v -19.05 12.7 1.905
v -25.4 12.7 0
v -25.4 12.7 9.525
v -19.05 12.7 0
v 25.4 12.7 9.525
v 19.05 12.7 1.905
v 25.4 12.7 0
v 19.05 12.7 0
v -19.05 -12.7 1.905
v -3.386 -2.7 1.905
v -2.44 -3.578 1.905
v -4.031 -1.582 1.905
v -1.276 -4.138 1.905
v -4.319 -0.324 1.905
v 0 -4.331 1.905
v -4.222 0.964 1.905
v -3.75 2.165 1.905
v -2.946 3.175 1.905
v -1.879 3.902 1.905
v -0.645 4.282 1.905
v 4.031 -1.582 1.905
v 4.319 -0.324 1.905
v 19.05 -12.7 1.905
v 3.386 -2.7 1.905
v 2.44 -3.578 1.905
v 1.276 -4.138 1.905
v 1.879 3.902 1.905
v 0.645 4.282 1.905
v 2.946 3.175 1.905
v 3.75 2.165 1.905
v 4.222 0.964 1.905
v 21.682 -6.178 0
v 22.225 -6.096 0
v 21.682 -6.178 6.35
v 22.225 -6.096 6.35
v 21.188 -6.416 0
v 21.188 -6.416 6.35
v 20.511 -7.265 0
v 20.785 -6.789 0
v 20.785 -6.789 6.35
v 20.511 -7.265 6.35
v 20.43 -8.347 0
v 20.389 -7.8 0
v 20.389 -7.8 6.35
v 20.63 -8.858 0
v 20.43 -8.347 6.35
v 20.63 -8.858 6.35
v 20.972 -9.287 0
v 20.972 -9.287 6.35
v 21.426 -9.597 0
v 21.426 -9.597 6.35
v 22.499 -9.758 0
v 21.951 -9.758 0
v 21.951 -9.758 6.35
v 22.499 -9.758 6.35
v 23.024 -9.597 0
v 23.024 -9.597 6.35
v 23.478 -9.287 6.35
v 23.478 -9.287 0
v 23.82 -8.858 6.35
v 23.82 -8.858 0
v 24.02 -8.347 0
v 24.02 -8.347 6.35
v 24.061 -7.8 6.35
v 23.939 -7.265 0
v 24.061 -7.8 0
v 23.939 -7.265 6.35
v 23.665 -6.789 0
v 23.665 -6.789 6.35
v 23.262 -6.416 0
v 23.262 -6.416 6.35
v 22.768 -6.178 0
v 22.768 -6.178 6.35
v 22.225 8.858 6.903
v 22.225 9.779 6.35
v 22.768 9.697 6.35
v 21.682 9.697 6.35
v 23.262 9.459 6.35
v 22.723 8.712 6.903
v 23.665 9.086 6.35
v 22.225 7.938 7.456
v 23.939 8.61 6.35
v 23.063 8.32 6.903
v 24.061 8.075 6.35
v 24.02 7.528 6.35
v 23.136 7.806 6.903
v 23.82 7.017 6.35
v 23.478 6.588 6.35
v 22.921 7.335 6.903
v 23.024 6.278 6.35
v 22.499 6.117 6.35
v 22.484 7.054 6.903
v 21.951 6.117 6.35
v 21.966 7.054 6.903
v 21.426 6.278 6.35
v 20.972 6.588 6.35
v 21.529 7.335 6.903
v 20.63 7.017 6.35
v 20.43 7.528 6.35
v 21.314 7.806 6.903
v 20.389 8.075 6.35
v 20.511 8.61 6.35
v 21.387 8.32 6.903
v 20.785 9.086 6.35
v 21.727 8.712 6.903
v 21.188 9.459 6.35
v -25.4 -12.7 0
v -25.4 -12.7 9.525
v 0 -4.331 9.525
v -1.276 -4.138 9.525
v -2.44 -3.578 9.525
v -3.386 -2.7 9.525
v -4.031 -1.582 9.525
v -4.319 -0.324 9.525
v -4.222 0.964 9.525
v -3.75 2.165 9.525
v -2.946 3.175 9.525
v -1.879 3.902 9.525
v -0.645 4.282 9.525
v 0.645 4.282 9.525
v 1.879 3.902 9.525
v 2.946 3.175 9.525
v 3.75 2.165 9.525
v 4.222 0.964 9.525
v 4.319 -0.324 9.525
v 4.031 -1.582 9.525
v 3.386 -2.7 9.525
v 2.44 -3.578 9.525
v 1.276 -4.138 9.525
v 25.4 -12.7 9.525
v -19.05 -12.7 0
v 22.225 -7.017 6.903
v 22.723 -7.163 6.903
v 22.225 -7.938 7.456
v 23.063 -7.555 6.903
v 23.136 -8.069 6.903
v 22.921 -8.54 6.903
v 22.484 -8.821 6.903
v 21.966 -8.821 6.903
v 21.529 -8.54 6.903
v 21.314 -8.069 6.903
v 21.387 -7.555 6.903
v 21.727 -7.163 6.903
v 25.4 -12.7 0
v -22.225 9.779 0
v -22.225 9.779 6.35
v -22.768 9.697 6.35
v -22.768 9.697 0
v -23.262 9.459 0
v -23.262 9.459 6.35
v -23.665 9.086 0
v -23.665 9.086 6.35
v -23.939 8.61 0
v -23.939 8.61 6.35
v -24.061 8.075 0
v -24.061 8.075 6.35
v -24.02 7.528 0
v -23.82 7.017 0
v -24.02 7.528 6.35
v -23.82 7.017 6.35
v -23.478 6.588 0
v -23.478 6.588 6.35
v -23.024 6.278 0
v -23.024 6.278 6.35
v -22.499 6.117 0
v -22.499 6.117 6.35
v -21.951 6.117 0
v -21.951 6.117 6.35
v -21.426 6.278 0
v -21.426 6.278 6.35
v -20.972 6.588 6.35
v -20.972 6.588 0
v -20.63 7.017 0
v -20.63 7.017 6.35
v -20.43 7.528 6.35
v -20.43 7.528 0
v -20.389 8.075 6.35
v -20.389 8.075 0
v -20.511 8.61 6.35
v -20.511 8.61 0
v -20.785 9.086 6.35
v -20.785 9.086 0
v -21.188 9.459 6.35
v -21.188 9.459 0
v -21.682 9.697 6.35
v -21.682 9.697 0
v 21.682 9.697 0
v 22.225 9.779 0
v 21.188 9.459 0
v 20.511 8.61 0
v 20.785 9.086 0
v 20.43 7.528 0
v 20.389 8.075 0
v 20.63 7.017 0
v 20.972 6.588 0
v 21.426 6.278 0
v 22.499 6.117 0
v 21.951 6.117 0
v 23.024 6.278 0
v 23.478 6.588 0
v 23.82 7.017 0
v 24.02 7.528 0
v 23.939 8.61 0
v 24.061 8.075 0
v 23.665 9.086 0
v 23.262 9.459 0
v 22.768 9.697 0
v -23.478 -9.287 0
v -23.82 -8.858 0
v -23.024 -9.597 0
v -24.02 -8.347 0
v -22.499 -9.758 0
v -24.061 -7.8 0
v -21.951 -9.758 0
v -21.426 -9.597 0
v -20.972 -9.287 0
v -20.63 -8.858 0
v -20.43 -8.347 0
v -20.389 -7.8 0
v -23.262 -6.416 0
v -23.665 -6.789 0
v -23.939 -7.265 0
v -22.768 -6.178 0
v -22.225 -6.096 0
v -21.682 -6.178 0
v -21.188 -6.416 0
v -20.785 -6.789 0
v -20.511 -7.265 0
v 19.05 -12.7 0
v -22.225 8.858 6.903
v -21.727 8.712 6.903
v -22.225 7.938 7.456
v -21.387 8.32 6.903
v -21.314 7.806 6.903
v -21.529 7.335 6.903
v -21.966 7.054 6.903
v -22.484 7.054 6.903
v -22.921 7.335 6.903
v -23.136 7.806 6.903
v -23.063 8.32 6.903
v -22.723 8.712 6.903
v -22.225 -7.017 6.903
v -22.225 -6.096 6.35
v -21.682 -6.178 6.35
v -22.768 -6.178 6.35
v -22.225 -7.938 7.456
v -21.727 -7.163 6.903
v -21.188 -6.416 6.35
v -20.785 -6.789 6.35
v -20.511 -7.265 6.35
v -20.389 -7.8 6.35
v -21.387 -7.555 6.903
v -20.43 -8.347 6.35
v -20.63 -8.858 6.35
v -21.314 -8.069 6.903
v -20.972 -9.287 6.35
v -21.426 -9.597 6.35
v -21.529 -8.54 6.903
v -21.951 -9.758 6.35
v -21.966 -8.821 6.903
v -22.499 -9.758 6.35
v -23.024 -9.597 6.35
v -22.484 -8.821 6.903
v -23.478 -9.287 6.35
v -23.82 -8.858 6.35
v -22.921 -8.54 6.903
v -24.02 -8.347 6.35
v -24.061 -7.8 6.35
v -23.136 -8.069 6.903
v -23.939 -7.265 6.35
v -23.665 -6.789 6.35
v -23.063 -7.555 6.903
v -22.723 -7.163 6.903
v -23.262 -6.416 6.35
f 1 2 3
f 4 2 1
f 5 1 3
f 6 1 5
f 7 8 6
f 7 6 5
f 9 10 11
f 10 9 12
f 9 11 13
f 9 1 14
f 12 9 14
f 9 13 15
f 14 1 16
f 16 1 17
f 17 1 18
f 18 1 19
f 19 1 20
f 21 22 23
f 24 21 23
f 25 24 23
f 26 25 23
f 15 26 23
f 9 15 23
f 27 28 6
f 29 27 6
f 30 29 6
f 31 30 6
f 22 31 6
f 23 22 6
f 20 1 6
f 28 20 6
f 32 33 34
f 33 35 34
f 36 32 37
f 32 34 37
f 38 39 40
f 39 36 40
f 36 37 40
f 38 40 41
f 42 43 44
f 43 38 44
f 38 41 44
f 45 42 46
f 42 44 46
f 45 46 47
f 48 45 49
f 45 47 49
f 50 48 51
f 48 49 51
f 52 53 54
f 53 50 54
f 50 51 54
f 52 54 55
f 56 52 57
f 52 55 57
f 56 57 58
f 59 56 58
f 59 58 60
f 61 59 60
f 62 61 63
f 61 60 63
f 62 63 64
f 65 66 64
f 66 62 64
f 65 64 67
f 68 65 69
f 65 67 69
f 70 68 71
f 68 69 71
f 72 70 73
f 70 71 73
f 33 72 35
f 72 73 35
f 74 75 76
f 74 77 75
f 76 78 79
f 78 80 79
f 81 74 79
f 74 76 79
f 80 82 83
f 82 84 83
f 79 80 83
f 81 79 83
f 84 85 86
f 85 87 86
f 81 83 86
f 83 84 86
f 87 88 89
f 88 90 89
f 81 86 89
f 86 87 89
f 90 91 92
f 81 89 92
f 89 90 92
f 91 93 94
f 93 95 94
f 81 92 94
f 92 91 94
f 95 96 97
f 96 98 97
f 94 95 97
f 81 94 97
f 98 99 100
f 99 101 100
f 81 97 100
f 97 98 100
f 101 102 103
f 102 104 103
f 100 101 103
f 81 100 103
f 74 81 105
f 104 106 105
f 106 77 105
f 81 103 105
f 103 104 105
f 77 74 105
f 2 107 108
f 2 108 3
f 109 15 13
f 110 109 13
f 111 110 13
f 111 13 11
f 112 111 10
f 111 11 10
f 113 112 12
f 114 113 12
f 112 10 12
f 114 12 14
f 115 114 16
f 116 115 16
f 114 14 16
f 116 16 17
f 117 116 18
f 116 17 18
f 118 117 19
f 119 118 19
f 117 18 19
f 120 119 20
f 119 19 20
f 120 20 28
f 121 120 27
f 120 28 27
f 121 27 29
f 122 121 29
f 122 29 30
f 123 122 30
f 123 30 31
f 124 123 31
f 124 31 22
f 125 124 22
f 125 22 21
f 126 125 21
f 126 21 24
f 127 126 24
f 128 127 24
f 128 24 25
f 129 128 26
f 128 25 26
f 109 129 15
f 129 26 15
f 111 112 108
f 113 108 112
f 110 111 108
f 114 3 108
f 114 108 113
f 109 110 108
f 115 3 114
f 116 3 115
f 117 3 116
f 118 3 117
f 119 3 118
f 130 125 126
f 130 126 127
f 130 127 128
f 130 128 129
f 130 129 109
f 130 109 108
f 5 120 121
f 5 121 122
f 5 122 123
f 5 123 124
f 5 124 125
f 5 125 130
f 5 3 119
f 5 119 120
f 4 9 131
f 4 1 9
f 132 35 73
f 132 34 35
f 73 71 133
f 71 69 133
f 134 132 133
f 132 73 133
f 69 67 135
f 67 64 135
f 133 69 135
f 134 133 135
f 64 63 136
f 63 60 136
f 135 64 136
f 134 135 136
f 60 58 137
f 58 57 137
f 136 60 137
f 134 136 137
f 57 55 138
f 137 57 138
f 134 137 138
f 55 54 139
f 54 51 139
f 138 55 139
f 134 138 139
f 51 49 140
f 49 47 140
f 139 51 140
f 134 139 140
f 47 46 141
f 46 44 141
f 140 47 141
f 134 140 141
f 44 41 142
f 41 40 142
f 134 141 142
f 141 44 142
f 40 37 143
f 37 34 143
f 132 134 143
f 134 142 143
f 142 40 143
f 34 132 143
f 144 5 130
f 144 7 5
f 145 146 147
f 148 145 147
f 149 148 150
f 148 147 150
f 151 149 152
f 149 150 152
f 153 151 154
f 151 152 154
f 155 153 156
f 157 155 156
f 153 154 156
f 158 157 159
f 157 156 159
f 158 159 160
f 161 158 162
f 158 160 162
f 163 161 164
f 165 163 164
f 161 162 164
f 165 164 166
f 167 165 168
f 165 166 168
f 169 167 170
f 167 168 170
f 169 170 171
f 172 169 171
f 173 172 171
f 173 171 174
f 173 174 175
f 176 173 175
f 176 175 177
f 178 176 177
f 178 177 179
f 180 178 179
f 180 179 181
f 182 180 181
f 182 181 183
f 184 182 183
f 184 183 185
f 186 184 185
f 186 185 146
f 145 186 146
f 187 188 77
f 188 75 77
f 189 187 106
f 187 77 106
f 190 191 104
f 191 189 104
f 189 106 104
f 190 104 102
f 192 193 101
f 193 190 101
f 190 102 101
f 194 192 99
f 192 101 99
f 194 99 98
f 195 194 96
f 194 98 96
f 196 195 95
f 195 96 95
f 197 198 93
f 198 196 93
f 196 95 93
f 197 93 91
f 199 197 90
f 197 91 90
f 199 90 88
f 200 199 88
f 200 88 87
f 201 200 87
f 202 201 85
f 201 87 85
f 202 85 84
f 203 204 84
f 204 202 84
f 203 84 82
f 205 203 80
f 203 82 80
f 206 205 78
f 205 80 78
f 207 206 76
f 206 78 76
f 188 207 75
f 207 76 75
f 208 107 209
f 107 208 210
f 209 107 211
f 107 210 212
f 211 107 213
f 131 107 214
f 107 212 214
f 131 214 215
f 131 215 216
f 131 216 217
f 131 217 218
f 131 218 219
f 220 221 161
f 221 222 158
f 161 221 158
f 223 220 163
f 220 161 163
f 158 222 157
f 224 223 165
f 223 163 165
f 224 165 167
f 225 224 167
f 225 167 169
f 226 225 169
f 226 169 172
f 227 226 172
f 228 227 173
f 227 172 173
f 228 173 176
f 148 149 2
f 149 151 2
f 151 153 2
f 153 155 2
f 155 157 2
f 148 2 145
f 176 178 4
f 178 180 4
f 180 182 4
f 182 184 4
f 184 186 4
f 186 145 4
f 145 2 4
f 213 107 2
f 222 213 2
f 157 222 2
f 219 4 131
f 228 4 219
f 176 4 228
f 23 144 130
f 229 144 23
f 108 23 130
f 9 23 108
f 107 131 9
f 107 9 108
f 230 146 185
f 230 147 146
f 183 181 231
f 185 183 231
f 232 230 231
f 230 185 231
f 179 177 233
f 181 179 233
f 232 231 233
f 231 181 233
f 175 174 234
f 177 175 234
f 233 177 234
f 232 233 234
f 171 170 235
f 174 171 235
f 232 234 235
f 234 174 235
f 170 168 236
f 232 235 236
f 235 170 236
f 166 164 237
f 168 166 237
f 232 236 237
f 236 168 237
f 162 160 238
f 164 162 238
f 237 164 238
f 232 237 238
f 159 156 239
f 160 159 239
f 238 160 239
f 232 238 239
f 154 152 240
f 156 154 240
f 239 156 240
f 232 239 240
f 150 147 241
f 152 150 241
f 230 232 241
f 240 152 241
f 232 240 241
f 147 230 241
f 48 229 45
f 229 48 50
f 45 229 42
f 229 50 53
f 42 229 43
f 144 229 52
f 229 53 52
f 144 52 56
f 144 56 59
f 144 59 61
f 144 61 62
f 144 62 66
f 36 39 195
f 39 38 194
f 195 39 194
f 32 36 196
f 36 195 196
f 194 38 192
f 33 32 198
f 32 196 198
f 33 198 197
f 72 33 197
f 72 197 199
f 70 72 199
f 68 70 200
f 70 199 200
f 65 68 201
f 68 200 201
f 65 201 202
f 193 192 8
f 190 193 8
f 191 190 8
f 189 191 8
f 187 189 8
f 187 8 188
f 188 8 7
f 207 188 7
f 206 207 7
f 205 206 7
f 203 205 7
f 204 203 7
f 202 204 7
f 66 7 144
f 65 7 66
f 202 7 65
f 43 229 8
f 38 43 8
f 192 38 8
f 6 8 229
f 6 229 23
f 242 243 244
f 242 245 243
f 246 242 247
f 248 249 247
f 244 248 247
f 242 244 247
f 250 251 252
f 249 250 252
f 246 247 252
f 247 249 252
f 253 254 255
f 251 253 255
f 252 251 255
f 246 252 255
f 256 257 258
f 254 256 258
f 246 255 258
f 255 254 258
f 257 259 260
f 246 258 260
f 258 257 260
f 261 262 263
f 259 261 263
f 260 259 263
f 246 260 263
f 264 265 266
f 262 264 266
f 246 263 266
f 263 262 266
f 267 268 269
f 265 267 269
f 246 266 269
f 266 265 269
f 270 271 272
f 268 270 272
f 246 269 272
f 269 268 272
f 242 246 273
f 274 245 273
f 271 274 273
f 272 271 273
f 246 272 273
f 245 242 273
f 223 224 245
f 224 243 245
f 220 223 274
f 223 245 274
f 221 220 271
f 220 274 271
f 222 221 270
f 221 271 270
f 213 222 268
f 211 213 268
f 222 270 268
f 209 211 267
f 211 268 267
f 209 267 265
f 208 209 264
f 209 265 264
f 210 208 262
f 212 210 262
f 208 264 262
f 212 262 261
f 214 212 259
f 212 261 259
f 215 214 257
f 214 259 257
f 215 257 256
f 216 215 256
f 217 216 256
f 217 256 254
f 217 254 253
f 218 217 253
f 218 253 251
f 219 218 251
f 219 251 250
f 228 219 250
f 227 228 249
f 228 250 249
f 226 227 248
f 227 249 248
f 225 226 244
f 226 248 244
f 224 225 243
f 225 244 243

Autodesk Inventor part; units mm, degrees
ref_plane "YZ Plane" through (0, 0, 0) normal (1, 0, 0) x (0, 1, 0)
ref_plane "XZ Plane" through (0, 0, 0) normal (0, 1, 0) x (-1, 0, 0)
ref_plane "XY Plane" through (0, 0, 0) normal (0, 0, 1) x (1, 0, 0)
sketch "Sketch1" plane through (0, 0, 0) normal (0, 0, 1) x (1, 0, 0)
  line L0 (-35.56, 0) -> (35.56, 0) projected
  line L1 (0, -20.0025) -> (0, 20.0025) projected
  line L2 (-25.4, 12.7) -> (25.4, 12.7)
  line L3 (25.4, 12.7) -> (25.4, -12.7)
  line L4 (25.4, -12.7) -> (-25.4, -12.7)
  line L5 (-25.4, -12.7) -> (-25.4, 12.7)
  circle A0 centre (0, 0) radius 14.2875 construction
  point P0 (-25.4, 0)
  point P1 (0, 12.7)
  dimension "d0" = 28.575
  dimension "d1" = 50.8
  dimension "d2" = 25.4
extrude "Extrusion1" add sketch "Sketch1" along normal blind 9.525
sketch "Sketch2" plane through (-25.4, 12.7, 0) normal (0, 1, 0) x (1, 0, 0)
  line L0 (0, -9.525) -> (50.8, -9.525) projected
  line L1 (0, 0) -> (50.8, 0) projected
  line L2 (0, 0) -> (0, -9.525) projected
  line L3 (44.45, 0) -> (44.45, -1.905)
  line L4 (6.35, -1.905) -> (6.35, 0)
  line L5 (6.35, -1.905) -> (44.45, -1.905)
  line L6 (25.4, 0) -> (25.4, -9.525) construction
  dimension "d5" = 6.35
  dimension "d7" = 1.905
extrude "Extrusion2" cut sketch "Sketch2" against normal through all
sketch "Sketch3" plane through (0, 0, 0) normal (0, 0, -1) x (-1, 0, 0)
  line L0 (25.4, 12.7) -> (19.05, 12.7) projected
  line L1 (35.56, 0) -> (-35.56, 0) projected
  line L2 (0, -17.78) -> (0, 17.78) projected
  point P0 (0, 0)
  point P1 (22.225, 7.9375)
  point P2 (22.225, -7.9375)
  point P3 (22.225, 12.7)
  dimension "d10" = 4.7625
hole "Hole1" at (-22.225, 7.9375, 0) at (-22.225, -7.9375, 0) direction (0, 0, 1) diameter 3.683 depth 6.35 tip angle 118 thread size "10-24 UNC" class "2B" standard "ANSI Unified Screw Threads"
mirror "Mirror1" about plane through (0, 0, 0) normal (1, 0, 0) of "Hole1"
sketch "Sketch4" plane through (0, 0, 9.525) normal (0, 0, 1) x (1, 0, 0)
  point P0 (0, 0)
  point P1 (0, 0)
hole "Hole2" at (0, 0, 9.525) direction (0, 0, -1) diameter 8.6614 end through all thread size "3/8-32 UNEF" class "2B" standard "ANSI Unified Screw Threads"
properties part number "encoder mount"
